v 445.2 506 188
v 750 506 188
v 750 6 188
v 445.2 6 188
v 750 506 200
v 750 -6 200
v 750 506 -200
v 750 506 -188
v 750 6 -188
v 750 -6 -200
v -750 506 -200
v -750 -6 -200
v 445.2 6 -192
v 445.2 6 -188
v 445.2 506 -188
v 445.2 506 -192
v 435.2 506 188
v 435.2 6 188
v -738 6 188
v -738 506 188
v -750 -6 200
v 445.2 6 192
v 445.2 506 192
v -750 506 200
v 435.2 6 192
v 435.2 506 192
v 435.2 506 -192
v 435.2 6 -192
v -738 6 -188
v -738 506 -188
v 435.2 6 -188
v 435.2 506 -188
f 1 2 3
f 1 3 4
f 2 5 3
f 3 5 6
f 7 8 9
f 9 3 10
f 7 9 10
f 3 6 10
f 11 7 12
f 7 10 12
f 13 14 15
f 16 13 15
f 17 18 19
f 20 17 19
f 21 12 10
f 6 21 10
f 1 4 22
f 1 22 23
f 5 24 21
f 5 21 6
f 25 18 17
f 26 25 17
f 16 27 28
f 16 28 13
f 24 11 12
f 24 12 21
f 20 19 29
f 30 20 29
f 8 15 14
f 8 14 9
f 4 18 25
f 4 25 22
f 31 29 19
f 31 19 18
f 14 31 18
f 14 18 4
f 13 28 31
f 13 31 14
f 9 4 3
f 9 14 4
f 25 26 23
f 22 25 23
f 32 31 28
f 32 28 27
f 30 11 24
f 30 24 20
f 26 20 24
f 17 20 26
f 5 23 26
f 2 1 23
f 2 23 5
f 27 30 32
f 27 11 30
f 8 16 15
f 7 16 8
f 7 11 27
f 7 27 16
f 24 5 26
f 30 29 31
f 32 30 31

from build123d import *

# Parameters (mm, degrees)
SKETCH1_W           = 1500
SKETCH1_H           = 400
BOSS_EXTRUDE1_DEPTH = 6
BOSS_EXTRUDE2_DEPTH = 500
SKETCH3_W           = 10
SKETCH3_H           = 500
CUT_EXTRUDE1_DEPTH  = 4


with BuildPart() as part:
    # Sketch1 → Boss-Extrude1 (new, symmetric)
    with BuildSketch(Plane(origin=(0, 0, 0), x_dir=(1, 0, 0), z_dir=(0, 1, 0))):
        Rectangle(SKETCH1_W, SKETCH1_H)
    extrude(amount=BOSS_EXTRUDE1_DEPTH, both=True)

    # Sketch2 → Boss-Extrude2 (add)
    with BuildSketch(Plane(origin=(0, 6, 0), x_dir=(1, 0, 0), z_dir=(0, 1, 0))):
        Polygon((738, 188), (750, 188), (750, 200), (-750, 200), (-750, -200), (750, -200), (750, -188), (738, -188), (-738, -188), (-738, 188), align=None)
    extrude(amount=BOSS_EXTRUDE2_DEPTH)

    # Sketch3 → Cut-Extrude1 (cut)
    with BuildSketch(Plane.XY.offset(-188)):
        with Locations((440.2, 256)):
            Rectangle(SKETCH3_W, SKETCH3_H)
    cut_extrude1 = extrude(amount=-CUT_EXTRUDE1_DEPTH, mode=Mode.SUBTRACT)

    # Mirror1: Cut-Extrude1 across plane
    add(cut_extrude1.mirror(Plane.XY), mode=Mode.SUBTRACT)


solid = part.part
